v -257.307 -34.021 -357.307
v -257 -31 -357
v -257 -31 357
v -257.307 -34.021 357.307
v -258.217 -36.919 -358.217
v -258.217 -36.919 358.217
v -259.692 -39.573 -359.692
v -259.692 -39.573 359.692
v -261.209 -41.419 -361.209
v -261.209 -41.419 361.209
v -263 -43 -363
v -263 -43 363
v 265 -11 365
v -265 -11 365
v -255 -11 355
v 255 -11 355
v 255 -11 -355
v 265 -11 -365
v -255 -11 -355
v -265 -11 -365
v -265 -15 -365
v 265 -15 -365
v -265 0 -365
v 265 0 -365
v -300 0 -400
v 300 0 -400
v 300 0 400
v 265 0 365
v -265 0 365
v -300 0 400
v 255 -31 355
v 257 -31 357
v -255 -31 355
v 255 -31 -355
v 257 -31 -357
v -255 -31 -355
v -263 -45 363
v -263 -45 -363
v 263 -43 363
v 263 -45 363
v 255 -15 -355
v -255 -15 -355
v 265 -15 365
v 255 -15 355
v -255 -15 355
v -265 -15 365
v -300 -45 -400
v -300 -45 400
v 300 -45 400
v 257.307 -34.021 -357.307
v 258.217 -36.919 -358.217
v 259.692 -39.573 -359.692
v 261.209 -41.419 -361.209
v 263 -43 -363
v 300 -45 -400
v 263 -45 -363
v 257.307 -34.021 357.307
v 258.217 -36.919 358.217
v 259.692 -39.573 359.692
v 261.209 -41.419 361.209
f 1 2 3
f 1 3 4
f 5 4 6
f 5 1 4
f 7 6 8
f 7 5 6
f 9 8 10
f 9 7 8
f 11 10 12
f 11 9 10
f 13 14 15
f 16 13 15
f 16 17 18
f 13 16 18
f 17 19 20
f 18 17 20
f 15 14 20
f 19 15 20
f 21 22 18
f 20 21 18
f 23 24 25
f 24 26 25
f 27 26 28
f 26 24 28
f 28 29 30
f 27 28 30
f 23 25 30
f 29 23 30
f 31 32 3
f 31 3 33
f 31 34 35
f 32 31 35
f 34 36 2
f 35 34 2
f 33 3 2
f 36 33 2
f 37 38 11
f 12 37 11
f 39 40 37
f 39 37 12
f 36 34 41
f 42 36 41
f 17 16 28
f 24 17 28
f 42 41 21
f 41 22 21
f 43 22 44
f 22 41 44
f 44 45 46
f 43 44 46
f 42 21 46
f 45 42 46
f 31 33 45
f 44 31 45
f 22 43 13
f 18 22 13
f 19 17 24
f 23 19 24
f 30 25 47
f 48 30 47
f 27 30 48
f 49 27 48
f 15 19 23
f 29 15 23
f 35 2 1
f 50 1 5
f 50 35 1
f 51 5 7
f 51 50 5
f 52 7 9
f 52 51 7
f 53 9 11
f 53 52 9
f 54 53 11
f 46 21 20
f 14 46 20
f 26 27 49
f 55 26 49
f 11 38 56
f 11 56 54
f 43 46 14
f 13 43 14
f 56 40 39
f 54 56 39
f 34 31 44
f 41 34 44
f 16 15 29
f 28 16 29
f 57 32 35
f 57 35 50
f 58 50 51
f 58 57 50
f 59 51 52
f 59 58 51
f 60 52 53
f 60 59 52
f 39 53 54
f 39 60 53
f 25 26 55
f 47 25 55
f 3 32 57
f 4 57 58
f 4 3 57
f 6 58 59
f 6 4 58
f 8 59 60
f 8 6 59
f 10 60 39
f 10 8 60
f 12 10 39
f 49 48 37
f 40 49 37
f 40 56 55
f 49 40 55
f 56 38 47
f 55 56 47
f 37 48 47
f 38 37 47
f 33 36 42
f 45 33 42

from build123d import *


with BuildPart() as f2:
    # F2: sweep along a path in F0
    with BuildLine(Plane.XZ) as f2_path:
        Line((300, 400), (-300, 400))
        Line((-300, 400), (-300, -400))
        Line((-300, -400), (300, -400))
        Line((300, -400), (300, 400))
    # F1 (on Top) → F2 (sweep)
    with BuildSketch(Plane.XY):
        with BuildLine():
            Line((-265, 0), (-300, 0))
            Line((-300, 0), (-300, -45))
            Line((-300, -45), (-263, -45))
            Line((-263, -45), (-263, -43))
            ThreePointArc((-263, -43), (-258.583592135, -37.7082039325), (-257, -31))
            Line((-257, -31), (-255, -31))
            Line((-255, -31), (-255, -15))
            Line((-255, -15), (-265, -15))
            Line((-265, -15), (-265, -11))
            Line((-265, -11), (-255, -11))
            Line((-255, -11), (-265, 0))
        make_face()
    sweep(path=f2_path.line, transition=Transition.RIGHT)


solid = f2.part
